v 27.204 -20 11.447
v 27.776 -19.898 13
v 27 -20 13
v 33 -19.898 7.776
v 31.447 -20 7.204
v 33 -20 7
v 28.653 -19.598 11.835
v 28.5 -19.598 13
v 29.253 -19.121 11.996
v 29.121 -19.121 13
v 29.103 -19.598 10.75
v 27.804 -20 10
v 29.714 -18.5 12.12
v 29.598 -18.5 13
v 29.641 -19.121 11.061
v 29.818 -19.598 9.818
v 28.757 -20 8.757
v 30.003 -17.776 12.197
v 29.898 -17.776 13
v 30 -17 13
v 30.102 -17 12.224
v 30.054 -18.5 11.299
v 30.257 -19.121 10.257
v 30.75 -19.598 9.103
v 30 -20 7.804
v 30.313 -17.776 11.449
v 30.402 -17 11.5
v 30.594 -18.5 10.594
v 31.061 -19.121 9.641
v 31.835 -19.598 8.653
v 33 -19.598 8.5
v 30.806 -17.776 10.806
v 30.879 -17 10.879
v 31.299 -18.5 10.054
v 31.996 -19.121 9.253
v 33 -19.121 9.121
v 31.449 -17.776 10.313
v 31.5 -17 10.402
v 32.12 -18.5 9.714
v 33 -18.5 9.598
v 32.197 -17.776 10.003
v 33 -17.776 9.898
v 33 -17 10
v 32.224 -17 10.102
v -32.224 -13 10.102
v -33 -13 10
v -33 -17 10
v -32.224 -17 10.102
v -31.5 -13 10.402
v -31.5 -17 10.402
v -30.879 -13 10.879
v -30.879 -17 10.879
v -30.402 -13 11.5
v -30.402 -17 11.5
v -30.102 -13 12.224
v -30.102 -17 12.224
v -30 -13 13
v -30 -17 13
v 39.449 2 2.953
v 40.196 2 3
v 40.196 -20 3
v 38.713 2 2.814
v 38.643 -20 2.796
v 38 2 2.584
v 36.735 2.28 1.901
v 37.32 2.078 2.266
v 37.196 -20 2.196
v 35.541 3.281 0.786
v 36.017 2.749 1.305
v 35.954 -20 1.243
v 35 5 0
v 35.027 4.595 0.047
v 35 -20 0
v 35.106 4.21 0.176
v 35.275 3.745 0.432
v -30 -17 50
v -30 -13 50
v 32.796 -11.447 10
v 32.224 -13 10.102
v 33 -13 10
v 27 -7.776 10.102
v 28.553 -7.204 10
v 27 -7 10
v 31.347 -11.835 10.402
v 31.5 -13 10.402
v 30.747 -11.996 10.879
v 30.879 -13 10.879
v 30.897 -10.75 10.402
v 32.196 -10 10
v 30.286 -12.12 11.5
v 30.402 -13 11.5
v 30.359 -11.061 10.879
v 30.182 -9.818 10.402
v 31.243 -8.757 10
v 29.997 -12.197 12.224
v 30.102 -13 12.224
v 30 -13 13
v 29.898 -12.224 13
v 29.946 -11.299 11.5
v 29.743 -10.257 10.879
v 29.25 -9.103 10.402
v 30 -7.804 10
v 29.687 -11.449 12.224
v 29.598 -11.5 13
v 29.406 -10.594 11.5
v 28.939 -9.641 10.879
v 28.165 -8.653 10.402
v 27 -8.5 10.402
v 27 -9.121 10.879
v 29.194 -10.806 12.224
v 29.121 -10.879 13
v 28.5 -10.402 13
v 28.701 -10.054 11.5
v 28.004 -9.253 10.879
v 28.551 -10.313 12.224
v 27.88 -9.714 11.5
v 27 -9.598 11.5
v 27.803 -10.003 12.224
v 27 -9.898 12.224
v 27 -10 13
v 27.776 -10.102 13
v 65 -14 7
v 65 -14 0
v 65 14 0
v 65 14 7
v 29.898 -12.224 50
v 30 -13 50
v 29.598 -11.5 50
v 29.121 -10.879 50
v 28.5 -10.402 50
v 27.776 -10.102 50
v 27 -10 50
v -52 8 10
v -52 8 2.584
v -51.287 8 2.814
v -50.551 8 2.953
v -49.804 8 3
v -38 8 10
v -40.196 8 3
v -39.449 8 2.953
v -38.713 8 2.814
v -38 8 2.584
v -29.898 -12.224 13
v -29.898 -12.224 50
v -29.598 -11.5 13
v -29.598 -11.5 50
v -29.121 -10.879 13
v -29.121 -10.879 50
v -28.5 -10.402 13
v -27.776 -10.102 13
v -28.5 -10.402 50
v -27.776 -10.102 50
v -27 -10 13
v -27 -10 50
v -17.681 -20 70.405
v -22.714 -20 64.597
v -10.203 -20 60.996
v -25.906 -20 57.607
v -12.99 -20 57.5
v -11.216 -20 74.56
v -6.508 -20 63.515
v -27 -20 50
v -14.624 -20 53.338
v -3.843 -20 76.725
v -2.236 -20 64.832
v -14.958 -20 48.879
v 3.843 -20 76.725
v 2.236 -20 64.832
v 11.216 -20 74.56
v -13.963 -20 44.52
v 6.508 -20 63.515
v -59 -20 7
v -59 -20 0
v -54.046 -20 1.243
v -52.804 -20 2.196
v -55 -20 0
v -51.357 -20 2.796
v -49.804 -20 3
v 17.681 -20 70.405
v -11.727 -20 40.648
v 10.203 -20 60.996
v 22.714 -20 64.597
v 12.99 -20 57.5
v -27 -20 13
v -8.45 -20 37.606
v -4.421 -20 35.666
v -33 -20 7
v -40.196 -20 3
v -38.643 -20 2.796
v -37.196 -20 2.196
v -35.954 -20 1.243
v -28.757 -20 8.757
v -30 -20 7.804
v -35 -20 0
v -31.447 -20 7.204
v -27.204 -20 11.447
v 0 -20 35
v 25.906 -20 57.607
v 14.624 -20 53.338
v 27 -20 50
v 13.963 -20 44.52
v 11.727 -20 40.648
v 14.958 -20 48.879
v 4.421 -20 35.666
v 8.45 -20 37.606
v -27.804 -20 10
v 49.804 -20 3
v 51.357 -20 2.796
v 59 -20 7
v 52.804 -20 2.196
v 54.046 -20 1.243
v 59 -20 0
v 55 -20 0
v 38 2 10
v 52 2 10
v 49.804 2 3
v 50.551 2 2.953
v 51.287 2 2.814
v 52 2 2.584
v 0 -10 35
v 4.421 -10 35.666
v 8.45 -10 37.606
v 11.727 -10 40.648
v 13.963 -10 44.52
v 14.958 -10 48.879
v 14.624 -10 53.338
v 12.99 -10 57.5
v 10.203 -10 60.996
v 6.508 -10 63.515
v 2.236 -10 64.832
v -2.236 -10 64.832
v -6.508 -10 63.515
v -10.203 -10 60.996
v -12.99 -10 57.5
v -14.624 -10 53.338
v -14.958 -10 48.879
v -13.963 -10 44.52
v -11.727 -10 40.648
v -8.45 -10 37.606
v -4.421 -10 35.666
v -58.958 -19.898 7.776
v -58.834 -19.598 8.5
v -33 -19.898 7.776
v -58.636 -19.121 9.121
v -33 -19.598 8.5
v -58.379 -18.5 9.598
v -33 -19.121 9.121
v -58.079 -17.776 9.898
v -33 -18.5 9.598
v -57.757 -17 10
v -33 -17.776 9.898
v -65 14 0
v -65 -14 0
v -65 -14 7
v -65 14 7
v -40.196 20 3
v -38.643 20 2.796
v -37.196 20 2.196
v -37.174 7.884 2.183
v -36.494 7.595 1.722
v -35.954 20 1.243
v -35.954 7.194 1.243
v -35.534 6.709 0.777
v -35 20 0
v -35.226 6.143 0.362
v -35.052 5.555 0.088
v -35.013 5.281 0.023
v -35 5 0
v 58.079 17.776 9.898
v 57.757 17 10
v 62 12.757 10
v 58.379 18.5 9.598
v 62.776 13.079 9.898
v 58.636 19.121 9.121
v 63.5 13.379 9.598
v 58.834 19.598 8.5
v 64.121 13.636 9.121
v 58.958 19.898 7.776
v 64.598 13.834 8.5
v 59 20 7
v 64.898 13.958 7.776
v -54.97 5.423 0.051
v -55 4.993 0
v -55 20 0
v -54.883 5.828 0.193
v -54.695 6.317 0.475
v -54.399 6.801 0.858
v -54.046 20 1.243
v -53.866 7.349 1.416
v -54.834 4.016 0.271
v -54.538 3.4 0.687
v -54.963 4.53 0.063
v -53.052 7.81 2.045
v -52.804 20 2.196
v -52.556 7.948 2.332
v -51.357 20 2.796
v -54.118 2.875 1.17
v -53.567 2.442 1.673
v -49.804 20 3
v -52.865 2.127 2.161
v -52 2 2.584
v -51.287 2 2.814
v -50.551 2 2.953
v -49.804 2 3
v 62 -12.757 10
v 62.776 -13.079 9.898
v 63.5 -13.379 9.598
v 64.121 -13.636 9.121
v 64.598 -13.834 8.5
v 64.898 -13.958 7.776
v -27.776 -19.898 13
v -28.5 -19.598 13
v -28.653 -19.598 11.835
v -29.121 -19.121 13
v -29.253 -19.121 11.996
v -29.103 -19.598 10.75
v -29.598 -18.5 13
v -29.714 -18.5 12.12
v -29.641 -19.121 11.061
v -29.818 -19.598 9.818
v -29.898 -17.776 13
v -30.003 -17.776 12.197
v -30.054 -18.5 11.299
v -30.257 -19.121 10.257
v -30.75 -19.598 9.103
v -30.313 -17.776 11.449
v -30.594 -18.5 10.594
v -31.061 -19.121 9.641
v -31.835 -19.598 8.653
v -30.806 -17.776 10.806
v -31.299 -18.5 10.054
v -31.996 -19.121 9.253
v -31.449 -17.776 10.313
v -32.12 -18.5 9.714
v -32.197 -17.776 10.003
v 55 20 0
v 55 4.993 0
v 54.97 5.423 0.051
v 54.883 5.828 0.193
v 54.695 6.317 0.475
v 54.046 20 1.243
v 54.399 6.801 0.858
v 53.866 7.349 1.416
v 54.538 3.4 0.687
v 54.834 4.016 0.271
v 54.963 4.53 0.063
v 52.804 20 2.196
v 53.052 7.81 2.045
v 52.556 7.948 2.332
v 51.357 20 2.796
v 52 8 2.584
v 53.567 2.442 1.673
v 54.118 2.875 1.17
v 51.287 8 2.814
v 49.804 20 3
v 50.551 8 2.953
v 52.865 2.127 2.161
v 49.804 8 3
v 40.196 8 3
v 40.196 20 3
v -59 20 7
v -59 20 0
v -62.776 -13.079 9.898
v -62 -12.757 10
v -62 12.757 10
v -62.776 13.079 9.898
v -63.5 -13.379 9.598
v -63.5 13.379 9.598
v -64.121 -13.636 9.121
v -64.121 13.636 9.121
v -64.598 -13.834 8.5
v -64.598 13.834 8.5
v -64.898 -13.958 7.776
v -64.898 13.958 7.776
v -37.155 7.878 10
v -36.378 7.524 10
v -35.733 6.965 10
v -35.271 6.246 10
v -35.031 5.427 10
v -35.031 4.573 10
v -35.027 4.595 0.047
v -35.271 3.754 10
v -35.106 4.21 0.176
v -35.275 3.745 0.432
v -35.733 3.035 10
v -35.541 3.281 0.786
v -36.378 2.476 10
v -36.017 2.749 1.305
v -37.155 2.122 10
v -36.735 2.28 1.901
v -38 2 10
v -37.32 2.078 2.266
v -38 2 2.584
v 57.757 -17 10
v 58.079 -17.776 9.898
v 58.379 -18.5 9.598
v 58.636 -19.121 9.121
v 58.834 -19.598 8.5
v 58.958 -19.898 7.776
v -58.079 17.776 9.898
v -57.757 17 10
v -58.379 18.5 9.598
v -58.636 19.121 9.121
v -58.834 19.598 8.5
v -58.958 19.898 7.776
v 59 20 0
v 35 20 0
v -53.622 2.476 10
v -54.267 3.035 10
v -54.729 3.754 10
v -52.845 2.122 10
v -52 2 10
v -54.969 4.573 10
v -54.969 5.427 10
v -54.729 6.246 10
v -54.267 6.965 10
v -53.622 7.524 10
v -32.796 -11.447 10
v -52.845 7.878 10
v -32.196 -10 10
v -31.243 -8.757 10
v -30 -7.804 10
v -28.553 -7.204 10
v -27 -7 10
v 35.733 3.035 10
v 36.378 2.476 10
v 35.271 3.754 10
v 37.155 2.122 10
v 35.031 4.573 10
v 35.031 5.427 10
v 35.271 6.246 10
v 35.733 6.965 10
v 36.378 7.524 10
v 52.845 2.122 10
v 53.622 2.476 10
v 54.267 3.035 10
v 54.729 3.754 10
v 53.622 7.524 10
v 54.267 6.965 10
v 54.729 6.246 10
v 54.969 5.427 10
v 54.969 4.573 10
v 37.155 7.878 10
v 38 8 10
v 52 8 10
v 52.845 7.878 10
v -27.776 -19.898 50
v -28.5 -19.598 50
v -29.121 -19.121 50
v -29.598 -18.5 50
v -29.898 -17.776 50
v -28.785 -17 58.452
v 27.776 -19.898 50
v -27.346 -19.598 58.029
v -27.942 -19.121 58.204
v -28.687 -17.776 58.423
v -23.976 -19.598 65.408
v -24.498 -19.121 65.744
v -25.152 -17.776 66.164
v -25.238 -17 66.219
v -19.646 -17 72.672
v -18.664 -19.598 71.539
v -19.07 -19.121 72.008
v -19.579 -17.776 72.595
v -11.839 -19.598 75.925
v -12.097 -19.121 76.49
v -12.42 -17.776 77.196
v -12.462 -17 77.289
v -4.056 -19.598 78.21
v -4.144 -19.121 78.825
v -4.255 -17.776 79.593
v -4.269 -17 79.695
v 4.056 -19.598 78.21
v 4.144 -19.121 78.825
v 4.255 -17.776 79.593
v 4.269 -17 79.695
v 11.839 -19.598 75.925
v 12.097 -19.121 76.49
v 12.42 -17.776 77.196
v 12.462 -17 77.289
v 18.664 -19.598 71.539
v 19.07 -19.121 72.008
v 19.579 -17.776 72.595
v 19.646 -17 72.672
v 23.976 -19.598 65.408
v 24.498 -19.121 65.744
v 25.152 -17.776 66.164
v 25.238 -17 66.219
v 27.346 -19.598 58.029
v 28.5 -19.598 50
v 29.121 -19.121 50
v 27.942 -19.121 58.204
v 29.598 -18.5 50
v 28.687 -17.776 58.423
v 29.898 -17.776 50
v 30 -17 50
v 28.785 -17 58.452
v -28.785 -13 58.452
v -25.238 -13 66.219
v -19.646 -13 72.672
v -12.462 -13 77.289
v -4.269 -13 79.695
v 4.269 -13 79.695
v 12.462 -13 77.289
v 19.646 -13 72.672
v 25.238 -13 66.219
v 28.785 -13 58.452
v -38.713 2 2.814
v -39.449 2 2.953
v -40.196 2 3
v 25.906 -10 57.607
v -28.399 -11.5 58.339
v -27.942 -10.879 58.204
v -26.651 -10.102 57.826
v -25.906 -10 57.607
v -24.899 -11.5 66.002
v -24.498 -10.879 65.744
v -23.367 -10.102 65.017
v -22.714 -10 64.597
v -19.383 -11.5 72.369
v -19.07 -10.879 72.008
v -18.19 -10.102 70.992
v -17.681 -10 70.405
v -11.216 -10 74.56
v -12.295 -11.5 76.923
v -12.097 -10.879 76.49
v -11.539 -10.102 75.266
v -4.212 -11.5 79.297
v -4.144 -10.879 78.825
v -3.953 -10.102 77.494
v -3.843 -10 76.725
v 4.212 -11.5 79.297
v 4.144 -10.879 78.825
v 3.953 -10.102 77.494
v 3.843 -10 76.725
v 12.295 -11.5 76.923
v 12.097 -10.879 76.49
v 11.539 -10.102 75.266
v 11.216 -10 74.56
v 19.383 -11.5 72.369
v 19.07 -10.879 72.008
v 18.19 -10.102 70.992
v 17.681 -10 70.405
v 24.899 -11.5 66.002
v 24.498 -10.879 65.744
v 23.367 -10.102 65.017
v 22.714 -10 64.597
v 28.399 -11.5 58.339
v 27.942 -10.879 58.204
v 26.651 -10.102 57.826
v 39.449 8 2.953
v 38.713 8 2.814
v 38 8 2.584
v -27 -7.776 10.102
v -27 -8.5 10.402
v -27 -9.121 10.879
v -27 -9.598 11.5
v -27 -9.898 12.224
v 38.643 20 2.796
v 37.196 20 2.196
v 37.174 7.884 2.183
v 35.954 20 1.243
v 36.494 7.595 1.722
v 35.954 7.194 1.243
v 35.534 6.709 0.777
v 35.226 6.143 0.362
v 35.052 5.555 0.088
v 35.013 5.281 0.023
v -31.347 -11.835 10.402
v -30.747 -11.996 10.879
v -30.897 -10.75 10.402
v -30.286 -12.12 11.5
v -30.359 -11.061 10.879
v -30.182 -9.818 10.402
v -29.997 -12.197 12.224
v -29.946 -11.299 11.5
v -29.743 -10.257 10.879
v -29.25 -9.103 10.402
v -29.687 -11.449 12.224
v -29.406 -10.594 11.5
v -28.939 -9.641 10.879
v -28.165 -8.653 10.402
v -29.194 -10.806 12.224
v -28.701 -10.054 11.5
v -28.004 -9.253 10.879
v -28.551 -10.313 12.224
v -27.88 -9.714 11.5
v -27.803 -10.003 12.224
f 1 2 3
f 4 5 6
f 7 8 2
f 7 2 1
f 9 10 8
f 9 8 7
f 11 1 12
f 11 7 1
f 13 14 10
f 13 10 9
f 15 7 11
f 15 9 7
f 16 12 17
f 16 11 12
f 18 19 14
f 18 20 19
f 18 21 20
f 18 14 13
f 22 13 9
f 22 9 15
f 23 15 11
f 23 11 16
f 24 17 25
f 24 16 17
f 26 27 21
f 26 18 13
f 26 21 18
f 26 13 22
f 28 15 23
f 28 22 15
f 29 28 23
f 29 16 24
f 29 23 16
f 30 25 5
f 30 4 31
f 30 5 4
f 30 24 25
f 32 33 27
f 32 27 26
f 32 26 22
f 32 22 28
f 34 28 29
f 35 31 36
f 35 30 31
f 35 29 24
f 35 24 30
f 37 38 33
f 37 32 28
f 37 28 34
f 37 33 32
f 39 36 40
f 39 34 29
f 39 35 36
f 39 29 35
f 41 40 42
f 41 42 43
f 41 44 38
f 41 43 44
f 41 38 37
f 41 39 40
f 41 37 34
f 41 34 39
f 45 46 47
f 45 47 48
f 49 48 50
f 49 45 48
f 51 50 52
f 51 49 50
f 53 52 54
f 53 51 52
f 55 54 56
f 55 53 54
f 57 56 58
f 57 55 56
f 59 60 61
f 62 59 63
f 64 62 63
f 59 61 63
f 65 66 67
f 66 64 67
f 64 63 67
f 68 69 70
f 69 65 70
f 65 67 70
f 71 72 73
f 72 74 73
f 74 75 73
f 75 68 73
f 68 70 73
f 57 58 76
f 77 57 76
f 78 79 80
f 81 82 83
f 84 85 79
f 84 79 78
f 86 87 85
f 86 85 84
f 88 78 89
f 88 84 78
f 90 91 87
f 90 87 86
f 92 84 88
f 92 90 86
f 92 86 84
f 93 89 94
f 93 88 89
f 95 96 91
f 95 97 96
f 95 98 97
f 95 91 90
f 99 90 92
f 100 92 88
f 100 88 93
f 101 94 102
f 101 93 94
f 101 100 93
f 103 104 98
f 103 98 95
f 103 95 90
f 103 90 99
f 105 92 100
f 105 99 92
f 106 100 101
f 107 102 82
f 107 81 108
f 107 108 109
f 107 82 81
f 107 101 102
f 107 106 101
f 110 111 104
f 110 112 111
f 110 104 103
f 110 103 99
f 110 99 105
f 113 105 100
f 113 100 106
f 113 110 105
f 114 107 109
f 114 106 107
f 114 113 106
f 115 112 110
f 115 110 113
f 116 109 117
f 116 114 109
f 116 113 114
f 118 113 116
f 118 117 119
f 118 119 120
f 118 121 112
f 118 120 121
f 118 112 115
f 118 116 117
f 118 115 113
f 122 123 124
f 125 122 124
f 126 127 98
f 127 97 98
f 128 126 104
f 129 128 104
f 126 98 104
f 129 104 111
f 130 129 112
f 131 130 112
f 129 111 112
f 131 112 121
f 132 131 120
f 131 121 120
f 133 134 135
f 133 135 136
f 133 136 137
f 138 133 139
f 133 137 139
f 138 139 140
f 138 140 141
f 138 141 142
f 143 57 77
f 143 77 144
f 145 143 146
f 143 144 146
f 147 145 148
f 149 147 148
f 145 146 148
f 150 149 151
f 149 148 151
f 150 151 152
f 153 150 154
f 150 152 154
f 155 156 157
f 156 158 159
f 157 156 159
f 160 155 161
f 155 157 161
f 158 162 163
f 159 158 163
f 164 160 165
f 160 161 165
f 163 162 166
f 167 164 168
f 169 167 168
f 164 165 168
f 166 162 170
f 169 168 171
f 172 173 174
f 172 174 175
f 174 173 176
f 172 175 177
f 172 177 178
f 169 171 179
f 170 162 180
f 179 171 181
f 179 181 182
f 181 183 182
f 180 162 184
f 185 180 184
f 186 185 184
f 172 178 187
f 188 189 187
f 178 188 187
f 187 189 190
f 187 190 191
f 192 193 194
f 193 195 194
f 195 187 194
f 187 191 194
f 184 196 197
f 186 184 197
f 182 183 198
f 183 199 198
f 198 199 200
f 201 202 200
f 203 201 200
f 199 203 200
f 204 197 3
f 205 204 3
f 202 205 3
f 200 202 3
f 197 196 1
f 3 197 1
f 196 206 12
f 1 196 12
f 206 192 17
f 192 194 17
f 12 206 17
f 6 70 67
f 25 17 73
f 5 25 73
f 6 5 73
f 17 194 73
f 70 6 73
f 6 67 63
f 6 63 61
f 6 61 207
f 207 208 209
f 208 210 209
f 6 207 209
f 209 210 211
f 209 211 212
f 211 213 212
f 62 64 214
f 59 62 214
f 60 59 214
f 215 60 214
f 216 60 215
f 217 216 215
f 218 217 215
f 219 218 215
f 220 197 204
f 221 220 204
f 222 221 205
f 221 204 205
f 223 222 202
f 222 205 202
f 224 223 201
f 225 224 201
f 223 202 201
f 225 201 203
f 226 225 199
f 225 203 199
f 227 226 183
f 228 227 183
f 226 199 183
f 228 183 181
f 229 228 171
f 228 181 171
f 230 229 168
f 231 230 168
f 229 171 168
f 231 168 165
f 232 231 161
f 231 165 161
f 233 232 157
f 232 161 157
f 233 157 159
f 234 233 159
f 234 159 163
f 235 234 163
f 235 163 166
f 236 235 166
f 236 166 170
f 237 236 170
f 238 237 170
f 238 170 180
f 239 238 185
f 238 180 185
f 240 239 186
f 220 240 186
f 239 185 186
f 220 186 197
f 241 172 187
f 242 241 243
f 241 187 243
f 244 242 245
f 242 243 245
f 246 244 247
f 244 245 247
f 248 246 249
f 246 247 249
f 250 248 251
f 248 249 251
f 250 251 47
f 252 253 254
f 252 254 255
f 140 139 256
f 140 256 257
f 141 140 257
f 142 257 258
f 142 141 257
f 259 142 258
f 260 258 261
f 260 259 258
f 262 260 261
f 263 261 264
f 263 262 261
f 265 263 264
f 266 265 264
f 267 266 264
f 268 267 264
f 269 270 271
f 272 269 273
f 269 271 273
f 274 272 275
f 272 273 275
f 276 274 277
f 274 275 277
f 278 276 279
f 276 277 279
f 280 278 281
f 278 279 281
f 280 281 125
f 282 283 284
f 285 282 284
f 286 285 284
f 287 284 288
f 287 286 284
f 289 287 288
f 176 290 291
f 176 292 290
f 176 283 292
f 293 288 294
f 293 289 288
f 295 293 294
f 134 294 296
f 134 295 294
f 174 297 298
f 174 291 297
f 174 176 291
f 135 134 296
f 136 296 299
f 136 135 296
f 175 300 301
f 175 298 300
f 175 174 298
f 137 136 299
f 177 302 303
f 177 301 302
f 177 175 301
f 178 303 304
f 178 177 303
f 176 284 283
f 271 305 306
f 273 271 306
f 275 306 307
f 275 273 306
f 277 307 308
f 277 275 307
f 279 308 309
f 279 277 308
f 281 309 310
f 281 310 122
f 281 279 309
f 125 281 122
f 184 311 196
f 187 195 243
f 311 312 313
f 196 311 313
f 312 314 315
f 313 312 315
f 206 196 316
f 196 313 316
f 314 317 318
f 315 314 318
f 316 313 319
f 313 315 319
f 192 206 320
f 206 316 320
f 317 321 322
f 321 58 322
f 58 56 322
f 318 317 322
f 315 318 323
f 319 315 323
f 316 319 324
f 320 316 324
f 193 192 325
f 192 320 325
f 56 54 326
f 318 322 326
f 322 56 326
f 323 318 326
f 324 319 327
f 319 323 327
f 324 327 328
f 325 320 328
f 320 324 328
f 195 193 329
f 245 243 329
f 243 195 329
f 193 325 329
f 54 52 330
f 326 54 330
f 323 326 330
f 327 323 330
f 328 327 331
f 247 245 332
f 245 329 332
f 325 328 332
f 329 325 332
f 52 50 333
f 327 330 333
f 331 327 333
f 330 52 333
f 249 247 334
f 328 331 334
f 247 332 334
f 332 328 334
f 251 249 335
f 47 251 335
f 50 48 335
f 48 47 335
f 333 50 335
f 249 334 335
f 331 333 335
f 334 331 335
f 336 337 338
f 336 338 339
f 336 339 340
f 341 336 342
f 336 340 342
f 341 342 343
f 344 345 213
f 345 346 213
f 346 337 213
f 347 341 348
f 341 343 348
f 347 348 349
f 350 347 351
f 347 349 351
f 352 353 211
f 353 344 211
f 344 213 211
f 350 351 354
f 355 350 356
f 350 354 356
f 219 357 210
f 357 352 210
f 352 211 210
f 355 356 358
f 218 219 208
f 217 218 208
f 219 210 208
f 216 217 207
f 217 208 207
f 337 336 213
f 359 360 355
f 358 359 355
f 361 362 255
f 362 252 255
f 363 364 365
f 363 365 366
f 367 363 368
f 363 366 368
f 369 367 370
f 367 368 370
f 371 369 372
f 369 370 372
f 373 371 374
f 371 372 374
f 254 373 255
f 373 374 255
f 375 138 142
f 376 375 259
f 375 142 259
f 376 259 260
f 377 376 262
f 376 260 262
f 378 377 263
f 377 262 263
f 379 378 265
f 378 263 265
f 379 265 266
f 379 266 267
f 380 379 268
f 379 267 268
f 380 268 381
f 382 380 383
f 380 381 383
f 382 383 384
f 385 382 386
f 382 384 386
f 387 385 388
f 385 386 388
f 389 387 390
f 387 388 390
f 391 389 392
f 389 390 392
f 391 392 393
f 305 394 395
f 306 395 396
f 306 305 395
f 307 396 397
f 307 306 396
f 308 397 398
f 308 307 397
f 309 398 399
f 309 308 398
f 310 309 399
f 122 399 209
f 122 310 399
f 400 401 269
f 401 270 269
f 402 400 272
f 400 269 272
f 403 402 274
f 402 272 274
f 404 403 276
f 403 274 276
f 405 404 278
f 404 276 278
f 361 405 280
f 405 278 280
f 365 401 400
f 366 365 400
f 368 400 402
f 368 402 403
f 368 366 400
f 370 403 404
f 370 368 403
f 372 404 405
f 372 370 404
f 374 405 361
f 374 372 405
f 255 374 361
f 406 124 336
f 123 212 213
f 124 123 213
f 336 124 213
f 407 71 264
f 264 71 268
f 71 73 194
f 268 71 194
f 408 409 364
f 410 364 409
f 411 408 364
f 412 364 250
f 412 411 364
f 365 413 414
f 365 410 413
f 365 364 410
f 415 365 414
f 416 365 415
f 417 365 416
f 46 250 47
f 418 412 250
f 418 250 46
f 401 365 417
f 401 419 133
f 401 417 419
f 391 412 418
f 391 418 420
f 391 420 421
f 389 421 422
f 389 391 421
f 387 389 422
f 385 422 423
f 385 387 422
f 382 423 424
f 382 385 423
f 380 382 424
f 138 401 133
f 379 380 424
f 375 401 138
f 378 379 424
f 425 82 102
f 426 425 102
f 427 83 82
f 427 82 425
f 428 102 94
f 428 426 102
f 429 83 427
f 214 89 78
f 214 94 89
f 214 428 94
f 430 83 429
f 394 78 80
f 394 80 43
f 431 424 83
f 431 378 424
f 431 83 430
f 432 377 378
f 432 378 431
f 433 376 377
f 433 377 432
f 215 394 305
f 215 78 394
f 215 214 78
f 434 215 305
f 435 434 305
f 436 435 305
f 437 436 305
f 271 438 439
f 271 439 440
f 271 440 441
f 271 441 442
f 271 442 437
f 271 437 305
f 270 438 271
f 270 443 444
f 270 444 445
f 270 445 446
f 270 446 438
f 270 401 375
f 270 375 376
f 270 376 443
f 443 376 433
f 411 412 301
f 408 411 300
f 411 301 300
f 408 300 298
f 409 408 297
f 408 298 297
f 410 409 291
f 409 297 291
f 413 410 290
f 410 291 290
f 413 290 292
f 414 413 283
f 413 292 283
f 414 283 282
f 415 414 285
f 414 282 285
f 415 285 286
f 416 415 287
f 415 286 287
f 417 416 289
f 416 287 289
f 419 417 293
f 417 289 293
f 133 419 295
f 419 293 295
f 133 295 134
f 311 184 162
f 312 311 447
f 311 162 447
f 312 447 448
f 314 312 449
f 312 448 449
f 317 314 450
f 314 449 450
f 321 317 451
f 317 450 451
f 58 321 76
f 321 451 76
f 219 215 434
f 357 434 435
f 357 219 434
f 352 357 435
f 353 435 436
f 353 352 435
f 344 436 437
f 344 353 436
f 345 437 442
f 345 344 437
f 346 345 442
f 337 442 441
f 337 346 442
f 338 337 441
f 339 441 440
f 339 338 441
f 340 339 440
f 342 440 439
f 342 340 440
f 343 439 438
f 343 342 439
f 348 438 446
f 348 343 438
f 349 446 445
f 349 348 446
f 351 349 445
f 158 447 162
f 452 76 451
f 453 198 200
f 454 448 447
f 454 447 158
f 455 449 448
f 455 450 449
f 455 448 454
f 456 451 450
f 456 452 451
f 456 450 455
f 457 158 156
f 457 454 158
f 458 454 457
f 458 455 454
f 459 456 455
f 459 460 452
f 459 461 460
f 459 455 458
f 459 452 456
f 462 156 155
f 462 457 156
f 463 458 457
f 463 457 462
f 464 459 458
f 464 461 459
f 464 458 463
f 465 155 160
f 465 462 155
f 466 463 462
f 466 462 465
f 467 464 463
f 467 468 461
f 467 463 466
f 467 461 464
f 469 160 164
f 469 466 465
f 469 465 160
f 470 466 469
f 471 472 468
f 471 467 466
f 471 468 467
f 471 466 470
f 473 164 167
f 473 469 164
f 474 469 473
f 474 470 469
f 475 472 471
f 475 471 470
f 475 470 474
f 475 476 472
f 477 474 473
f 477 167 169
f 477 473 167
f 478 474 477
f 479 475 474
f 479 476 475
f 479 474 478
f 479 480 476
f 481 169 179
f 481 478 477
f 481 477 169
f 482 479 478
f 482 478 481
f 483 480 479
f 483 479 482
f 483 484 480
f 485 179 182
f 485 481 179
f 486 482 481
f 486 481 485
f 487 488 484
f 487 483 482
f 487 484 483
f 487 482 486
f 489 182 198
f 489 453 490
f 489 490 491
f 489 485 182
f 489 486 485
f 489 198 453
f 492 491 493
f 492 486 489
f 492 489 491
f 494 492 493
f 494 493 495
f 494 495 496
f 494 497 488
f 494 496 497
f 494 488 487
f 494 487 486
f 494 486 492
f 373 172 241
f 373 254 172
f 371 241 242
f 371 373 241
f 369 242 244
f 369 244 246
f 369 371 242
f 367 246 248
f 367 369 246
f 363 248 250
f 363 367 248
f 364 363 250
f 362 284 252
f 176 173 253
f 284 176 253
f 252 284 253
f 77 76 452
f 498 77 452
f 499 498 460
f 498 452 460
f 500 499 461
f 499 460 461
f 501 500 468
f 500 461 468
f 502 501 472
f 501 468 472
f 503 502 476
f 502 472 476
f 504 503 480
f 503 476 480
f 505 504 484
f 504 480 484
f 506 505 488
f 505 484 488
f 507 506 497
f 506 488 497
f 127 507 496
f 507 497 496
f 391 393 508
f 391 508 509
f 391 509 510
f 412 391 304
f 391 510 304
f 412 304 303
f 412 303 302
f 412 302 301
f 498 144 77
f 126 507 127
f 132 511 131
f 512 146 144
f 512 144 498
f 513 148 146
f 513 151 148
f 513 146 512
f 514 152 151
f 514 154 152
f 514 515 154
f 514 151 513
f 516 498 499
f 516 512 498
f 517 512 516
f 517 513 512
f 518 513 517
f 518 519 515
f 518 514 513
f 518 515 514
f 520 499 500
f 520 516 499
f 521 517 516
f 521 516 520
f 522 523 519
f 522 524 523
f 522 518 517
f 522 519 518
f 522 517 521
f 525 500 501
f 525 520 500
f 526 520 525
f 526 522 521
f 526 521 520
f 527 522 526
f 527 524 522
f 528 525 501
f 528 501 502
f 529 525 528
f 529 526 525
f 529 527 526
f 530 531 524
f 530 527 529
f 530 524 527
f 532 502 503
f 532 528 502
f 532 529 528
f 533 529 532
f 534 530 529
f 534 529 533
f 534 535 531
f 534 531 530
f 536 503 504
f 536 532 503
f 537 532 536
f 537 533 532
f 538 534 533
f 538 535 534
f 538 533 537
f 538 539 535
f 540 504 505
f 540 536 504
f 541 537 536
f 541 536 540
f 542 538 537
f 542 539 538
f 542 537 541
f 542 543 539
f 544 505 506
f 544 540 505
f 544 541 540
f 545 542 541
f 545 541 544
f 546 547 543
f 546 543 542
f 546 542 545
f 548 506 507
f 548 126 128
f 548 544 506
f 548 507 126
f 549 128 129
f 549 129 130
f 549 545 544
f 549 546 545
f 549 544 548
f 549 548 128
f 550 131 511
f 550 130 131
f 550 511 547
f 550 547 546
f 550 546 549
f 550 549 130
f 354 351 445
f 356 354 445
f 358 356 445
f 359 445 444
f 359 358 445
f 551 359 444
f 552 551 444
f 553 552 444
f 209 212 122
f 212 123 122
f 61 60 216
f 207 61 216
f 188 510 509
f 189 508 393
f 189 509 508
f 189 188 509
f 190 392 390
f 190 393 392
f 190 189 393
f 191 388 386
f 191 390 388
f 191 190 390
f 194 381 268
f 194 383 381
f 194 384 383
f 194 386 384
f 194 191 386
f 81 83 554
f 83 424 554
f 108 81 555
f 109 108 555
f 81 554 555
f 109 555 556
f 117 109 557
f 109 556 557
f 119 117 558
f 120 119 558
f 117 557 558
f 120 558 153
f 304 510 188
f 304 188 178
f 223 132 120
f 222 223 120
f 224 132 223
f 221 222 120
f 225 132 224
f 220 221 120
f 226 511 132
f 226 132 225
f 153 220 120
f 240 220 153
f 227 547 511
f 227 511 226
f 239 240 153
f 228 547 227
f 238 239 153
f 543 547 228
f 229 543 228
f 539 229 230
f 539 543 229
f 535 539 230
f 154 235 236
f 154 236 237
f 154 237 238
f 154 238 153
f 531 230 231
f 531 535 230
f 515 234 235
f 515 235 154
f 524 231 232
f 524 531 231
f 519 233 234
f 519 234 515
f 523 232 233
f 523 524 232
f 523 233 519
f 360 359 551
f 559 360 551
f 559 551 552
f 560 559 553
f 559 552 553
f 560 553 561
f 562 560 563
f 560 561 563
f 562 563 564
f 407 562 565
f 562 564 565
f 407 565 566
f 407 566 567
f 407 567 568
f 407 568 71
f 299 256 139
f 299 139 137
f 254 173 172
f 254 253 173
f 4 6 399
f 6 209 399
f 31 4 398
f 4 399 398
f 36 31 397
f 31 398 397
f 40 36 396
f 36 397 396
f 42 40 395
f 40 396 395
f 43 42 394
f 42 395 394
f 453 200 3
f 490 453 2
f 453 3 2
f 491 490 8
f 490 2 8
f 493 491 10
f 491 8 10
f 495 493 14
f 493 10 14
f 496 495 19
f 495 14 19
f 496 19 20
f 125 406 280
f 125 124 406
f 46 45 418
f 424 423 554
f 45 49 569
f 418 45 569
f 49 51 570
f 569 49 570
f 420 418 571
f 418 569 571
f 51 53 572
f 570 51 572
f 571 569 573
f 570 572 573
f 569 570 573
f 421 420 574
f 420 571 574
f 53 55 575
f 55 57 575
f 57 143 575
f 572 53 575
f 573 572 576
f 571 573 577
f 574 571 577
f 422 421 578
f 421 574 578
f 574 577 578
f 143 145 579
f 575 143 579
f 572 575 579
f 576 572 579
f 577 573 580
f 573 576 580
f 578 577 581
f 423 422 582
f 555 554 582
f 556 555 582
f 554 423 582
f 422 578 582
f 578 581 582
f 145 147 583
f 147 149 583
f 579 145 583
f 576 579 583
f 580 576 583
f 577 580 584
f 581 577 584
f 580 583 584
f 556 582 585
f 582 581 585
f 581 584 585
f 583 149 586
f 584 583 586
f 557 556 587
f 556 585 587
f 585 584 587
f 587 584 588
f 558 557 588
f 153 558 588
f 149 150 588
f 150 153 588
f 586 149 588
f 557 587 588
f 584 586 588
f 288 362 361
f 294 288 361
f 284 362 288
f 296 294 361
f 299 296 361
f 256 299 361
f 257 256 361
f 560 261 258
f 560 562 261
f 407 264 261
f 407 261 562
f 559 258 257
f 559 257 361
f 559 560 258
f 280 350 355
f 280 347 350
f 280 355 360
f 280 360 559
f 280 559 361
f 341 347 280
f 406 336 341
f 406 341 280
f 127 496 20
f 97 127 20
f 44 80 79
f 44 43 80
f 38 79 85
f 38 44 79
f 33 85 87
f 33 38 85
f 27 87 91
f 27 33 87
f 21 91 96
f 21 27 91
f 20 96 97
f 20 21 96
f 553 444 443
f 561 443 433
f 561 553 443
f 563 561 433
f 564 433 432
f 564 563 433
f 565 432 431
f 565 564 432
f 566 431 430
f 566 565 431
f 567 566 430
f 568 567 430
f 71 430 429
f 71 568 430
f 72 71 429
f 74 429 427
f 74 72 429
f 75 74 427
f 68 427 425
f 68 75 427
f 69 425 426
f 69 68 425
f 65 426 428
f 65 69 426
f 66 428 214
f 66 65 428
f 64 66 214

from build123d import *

# Parameters (mm, degrees)
ESQUISSE1_W             = 130
ESQUISSE1_H             = 40
BOSS_EXTRU_1_DEPTH      = 10
ESQUISSE2_R             = 15
BOSS_EXTRU_2_DEPTH      = 10
ENL_V_MAT_EXTRU_1_DEPTH = 98.59610648
ESQUISSE4_W             = 20
ESQUISSE4_H             = 3
ENL_V_MAT_EXTRU_2_DEPTH = 111.566721937
CONG_5_START            = -20
CONG_5_DEPTH            = 40
CONG_5_START_2          = -4.421e-06
CONG_5_2_DEPTH          = 3.000004421
CHANFREIN1_SIZE         = 6
CONG_6_R                = 3


with BuildPart() as part:
    # Esquisse1 → Boss.-Extru.1 (new body)
    with BuildSketch(Plane.XY):
        Rectangle(ESQUISSE1_W, ESQUISSE1_H)
    extrude(amount=BOSS_EXTRU_1_DEPTH)

    # Esquisse2 → Boss.-Extru.2 (add)
    with BuildSketch(Plane.XZ.offset(20)):
        with BuildLine():
            Line((-30, 0), (-30, 50))
            ThreePointArc((-30, 50), (0, 80), (30, 50))
            Line((30, 50), (30, 0))
            Line((30, 0), (-30, 0))
        make_face()
        with Locations(Location((0, 50, 0), (0, 0, 270))):
            Circle(ESQUISSE2_R, mode=Mode.SUBTRACT)
    extrude(amount=-BOSS_EXTRU_2_DEPTH)

    # Esquisse3 → Enlèv. mat.-Extru.1 (cut, through all)
    with BuildSketch(Plane.XY.offset(10)):
        with BuildLine():
            Line((38, 8), (52, 8))
            ThreePointArc((52, 8), (55, 5), (52, 2))
            Line((52, 2), (38, 2))
            ThreePointArc((38, 2), (35, 5), (38, 8))
        make_face()
    enl_v_mat_extru_1 = extrude(amount=-ENL_V_MAT_EXTRU_1_DEPTH, mode=Mode.SUBTRACT)

    # Symétrie1: Enlèv. mat.-Extru.1 across plane
    add(enl_v_mat_extru_1.mirror(Plane(origin=(0, 0, 0), x_dir=(0, 0, 1), z_dir=(1, 0, 0))), mode=Mode.SUBTRACT)

    # Esquisse4 → Enlèv. mat.-Extru.2 (cut, through all)
    with BuildSketch(Plane(origin=(0, 20, 0), x_dir=(1, 0, 0), z_dir=(0, 1, 0))):
        with Locations((45, -1.5)):
            Rectangle(ESQUISSE4_W, ESQUISSE4_H)
    enl_v_mat_extru_2 = extrude(amount=-ENL_V_MAT_EXTRU_2_DEPTH, mode=Mode.SUBTRACT)

    # Congé5: read off the stored shape, not the designer's step
    # Congé5 outline → Congé5 (add)
    with BuildSketch(Plane(origin=(0, 0, 0), x_dir=(1, 0, 0), z_dir=(0, 1, 0)).offset(CONG_5_START)):
        with BuildLine():
            Line((55, -3), (55.000002552, 4.421e-06))
            ThreePointArc((55.000002552, 4.421e-06), (52.803849788, -2.196151147), (49.803847577, -3))
            Line((49.803847577, -3), (55, -3))
        make_face()
        with BuildLine():
            Line((35, -3), (40.196152423, -3))
            ThreePointArc((40.196152423, -3), (37.196152423, -2.196152423), (35, 0))
            Line((35, 0), (35, -3))
        make_face()
    cong_5 = extrude(amount=CONG_5_DEPTH)

    # Cong_5 2 outline → Cong_5 2 (cut)
    with BuildSketch(Plane.XY.offset(CONG_5_START_2)):
        with BuildLine():
            Line((52, 8), (38, 8))
            ThreePointArc((38, 8), (35, 5), (38, 2))
            Line((38, 2), (52, 2))
            ThreePointArc((52, 2), (55, 5), (52, 8))
        make_face()
    cong_5_2 = extrude(amount=CONG_5_2_DEPTH, mode=Mode.SUBTRACT)

    # Symétrie2: Enlèv. mat.-Extru.2, Congé5, Cong_5 2 across plane
    add(enl_v_mat_extru_2.mirror(Plane(origin=(0, 0, 0), x_dir=(0, 0, 1), z_dir=(1, 0, 0))), mode=Mode.SUBTRACT)
    add(cong_5.mirror(Plane(origin=(0, 0, 0), x_dir=(0, 0, 1), z_dir=(1, 0, 0))))
    add(cong_5_2.mirror(Plane(origin=(0, 0, 0), x_dir=(0, 0, 1), z_dir=(1, 0, 0))), mode=Mode.SUBTRACT)

    # Chanfrein1
    chanfrein1_edges = [part.edges().sort_by_distance(p)[0] for p in [
        (65, -20, 5),
        (-65, -20, 5),
        (-65, 20, 5),
        (65, 20, 5),
    ]]
    chamfer(chanfrein1_edges, length=CHANFREIN1_SIZE)

    # Congé6
    cong_6_edges = [part.edges().sort_by_distance(p)[0] for p in [
        (44.5, -20, 10),
        (65, 0, 10),
        (-44.5, -20, 10),
        (0, 20, 10),
        (-65, 0, 10),
        (-62, 17, 10),
        (62, 17, 10),
        (-62, -17, 10),
        (62, -17, 10),
        (-30, -10, 30),
        (-30, -15, 10),
        (0, -10, 80),
        (30, -15, 10),
        (30, -10, 30),
        (0, -10, 10),
        (30, -20, 30),
        (0, -20, 80),
        (-30, -20, 30),
    ]]
    fillet(cong_6_edges, radius=CONG_6_R)


solid = part.part
